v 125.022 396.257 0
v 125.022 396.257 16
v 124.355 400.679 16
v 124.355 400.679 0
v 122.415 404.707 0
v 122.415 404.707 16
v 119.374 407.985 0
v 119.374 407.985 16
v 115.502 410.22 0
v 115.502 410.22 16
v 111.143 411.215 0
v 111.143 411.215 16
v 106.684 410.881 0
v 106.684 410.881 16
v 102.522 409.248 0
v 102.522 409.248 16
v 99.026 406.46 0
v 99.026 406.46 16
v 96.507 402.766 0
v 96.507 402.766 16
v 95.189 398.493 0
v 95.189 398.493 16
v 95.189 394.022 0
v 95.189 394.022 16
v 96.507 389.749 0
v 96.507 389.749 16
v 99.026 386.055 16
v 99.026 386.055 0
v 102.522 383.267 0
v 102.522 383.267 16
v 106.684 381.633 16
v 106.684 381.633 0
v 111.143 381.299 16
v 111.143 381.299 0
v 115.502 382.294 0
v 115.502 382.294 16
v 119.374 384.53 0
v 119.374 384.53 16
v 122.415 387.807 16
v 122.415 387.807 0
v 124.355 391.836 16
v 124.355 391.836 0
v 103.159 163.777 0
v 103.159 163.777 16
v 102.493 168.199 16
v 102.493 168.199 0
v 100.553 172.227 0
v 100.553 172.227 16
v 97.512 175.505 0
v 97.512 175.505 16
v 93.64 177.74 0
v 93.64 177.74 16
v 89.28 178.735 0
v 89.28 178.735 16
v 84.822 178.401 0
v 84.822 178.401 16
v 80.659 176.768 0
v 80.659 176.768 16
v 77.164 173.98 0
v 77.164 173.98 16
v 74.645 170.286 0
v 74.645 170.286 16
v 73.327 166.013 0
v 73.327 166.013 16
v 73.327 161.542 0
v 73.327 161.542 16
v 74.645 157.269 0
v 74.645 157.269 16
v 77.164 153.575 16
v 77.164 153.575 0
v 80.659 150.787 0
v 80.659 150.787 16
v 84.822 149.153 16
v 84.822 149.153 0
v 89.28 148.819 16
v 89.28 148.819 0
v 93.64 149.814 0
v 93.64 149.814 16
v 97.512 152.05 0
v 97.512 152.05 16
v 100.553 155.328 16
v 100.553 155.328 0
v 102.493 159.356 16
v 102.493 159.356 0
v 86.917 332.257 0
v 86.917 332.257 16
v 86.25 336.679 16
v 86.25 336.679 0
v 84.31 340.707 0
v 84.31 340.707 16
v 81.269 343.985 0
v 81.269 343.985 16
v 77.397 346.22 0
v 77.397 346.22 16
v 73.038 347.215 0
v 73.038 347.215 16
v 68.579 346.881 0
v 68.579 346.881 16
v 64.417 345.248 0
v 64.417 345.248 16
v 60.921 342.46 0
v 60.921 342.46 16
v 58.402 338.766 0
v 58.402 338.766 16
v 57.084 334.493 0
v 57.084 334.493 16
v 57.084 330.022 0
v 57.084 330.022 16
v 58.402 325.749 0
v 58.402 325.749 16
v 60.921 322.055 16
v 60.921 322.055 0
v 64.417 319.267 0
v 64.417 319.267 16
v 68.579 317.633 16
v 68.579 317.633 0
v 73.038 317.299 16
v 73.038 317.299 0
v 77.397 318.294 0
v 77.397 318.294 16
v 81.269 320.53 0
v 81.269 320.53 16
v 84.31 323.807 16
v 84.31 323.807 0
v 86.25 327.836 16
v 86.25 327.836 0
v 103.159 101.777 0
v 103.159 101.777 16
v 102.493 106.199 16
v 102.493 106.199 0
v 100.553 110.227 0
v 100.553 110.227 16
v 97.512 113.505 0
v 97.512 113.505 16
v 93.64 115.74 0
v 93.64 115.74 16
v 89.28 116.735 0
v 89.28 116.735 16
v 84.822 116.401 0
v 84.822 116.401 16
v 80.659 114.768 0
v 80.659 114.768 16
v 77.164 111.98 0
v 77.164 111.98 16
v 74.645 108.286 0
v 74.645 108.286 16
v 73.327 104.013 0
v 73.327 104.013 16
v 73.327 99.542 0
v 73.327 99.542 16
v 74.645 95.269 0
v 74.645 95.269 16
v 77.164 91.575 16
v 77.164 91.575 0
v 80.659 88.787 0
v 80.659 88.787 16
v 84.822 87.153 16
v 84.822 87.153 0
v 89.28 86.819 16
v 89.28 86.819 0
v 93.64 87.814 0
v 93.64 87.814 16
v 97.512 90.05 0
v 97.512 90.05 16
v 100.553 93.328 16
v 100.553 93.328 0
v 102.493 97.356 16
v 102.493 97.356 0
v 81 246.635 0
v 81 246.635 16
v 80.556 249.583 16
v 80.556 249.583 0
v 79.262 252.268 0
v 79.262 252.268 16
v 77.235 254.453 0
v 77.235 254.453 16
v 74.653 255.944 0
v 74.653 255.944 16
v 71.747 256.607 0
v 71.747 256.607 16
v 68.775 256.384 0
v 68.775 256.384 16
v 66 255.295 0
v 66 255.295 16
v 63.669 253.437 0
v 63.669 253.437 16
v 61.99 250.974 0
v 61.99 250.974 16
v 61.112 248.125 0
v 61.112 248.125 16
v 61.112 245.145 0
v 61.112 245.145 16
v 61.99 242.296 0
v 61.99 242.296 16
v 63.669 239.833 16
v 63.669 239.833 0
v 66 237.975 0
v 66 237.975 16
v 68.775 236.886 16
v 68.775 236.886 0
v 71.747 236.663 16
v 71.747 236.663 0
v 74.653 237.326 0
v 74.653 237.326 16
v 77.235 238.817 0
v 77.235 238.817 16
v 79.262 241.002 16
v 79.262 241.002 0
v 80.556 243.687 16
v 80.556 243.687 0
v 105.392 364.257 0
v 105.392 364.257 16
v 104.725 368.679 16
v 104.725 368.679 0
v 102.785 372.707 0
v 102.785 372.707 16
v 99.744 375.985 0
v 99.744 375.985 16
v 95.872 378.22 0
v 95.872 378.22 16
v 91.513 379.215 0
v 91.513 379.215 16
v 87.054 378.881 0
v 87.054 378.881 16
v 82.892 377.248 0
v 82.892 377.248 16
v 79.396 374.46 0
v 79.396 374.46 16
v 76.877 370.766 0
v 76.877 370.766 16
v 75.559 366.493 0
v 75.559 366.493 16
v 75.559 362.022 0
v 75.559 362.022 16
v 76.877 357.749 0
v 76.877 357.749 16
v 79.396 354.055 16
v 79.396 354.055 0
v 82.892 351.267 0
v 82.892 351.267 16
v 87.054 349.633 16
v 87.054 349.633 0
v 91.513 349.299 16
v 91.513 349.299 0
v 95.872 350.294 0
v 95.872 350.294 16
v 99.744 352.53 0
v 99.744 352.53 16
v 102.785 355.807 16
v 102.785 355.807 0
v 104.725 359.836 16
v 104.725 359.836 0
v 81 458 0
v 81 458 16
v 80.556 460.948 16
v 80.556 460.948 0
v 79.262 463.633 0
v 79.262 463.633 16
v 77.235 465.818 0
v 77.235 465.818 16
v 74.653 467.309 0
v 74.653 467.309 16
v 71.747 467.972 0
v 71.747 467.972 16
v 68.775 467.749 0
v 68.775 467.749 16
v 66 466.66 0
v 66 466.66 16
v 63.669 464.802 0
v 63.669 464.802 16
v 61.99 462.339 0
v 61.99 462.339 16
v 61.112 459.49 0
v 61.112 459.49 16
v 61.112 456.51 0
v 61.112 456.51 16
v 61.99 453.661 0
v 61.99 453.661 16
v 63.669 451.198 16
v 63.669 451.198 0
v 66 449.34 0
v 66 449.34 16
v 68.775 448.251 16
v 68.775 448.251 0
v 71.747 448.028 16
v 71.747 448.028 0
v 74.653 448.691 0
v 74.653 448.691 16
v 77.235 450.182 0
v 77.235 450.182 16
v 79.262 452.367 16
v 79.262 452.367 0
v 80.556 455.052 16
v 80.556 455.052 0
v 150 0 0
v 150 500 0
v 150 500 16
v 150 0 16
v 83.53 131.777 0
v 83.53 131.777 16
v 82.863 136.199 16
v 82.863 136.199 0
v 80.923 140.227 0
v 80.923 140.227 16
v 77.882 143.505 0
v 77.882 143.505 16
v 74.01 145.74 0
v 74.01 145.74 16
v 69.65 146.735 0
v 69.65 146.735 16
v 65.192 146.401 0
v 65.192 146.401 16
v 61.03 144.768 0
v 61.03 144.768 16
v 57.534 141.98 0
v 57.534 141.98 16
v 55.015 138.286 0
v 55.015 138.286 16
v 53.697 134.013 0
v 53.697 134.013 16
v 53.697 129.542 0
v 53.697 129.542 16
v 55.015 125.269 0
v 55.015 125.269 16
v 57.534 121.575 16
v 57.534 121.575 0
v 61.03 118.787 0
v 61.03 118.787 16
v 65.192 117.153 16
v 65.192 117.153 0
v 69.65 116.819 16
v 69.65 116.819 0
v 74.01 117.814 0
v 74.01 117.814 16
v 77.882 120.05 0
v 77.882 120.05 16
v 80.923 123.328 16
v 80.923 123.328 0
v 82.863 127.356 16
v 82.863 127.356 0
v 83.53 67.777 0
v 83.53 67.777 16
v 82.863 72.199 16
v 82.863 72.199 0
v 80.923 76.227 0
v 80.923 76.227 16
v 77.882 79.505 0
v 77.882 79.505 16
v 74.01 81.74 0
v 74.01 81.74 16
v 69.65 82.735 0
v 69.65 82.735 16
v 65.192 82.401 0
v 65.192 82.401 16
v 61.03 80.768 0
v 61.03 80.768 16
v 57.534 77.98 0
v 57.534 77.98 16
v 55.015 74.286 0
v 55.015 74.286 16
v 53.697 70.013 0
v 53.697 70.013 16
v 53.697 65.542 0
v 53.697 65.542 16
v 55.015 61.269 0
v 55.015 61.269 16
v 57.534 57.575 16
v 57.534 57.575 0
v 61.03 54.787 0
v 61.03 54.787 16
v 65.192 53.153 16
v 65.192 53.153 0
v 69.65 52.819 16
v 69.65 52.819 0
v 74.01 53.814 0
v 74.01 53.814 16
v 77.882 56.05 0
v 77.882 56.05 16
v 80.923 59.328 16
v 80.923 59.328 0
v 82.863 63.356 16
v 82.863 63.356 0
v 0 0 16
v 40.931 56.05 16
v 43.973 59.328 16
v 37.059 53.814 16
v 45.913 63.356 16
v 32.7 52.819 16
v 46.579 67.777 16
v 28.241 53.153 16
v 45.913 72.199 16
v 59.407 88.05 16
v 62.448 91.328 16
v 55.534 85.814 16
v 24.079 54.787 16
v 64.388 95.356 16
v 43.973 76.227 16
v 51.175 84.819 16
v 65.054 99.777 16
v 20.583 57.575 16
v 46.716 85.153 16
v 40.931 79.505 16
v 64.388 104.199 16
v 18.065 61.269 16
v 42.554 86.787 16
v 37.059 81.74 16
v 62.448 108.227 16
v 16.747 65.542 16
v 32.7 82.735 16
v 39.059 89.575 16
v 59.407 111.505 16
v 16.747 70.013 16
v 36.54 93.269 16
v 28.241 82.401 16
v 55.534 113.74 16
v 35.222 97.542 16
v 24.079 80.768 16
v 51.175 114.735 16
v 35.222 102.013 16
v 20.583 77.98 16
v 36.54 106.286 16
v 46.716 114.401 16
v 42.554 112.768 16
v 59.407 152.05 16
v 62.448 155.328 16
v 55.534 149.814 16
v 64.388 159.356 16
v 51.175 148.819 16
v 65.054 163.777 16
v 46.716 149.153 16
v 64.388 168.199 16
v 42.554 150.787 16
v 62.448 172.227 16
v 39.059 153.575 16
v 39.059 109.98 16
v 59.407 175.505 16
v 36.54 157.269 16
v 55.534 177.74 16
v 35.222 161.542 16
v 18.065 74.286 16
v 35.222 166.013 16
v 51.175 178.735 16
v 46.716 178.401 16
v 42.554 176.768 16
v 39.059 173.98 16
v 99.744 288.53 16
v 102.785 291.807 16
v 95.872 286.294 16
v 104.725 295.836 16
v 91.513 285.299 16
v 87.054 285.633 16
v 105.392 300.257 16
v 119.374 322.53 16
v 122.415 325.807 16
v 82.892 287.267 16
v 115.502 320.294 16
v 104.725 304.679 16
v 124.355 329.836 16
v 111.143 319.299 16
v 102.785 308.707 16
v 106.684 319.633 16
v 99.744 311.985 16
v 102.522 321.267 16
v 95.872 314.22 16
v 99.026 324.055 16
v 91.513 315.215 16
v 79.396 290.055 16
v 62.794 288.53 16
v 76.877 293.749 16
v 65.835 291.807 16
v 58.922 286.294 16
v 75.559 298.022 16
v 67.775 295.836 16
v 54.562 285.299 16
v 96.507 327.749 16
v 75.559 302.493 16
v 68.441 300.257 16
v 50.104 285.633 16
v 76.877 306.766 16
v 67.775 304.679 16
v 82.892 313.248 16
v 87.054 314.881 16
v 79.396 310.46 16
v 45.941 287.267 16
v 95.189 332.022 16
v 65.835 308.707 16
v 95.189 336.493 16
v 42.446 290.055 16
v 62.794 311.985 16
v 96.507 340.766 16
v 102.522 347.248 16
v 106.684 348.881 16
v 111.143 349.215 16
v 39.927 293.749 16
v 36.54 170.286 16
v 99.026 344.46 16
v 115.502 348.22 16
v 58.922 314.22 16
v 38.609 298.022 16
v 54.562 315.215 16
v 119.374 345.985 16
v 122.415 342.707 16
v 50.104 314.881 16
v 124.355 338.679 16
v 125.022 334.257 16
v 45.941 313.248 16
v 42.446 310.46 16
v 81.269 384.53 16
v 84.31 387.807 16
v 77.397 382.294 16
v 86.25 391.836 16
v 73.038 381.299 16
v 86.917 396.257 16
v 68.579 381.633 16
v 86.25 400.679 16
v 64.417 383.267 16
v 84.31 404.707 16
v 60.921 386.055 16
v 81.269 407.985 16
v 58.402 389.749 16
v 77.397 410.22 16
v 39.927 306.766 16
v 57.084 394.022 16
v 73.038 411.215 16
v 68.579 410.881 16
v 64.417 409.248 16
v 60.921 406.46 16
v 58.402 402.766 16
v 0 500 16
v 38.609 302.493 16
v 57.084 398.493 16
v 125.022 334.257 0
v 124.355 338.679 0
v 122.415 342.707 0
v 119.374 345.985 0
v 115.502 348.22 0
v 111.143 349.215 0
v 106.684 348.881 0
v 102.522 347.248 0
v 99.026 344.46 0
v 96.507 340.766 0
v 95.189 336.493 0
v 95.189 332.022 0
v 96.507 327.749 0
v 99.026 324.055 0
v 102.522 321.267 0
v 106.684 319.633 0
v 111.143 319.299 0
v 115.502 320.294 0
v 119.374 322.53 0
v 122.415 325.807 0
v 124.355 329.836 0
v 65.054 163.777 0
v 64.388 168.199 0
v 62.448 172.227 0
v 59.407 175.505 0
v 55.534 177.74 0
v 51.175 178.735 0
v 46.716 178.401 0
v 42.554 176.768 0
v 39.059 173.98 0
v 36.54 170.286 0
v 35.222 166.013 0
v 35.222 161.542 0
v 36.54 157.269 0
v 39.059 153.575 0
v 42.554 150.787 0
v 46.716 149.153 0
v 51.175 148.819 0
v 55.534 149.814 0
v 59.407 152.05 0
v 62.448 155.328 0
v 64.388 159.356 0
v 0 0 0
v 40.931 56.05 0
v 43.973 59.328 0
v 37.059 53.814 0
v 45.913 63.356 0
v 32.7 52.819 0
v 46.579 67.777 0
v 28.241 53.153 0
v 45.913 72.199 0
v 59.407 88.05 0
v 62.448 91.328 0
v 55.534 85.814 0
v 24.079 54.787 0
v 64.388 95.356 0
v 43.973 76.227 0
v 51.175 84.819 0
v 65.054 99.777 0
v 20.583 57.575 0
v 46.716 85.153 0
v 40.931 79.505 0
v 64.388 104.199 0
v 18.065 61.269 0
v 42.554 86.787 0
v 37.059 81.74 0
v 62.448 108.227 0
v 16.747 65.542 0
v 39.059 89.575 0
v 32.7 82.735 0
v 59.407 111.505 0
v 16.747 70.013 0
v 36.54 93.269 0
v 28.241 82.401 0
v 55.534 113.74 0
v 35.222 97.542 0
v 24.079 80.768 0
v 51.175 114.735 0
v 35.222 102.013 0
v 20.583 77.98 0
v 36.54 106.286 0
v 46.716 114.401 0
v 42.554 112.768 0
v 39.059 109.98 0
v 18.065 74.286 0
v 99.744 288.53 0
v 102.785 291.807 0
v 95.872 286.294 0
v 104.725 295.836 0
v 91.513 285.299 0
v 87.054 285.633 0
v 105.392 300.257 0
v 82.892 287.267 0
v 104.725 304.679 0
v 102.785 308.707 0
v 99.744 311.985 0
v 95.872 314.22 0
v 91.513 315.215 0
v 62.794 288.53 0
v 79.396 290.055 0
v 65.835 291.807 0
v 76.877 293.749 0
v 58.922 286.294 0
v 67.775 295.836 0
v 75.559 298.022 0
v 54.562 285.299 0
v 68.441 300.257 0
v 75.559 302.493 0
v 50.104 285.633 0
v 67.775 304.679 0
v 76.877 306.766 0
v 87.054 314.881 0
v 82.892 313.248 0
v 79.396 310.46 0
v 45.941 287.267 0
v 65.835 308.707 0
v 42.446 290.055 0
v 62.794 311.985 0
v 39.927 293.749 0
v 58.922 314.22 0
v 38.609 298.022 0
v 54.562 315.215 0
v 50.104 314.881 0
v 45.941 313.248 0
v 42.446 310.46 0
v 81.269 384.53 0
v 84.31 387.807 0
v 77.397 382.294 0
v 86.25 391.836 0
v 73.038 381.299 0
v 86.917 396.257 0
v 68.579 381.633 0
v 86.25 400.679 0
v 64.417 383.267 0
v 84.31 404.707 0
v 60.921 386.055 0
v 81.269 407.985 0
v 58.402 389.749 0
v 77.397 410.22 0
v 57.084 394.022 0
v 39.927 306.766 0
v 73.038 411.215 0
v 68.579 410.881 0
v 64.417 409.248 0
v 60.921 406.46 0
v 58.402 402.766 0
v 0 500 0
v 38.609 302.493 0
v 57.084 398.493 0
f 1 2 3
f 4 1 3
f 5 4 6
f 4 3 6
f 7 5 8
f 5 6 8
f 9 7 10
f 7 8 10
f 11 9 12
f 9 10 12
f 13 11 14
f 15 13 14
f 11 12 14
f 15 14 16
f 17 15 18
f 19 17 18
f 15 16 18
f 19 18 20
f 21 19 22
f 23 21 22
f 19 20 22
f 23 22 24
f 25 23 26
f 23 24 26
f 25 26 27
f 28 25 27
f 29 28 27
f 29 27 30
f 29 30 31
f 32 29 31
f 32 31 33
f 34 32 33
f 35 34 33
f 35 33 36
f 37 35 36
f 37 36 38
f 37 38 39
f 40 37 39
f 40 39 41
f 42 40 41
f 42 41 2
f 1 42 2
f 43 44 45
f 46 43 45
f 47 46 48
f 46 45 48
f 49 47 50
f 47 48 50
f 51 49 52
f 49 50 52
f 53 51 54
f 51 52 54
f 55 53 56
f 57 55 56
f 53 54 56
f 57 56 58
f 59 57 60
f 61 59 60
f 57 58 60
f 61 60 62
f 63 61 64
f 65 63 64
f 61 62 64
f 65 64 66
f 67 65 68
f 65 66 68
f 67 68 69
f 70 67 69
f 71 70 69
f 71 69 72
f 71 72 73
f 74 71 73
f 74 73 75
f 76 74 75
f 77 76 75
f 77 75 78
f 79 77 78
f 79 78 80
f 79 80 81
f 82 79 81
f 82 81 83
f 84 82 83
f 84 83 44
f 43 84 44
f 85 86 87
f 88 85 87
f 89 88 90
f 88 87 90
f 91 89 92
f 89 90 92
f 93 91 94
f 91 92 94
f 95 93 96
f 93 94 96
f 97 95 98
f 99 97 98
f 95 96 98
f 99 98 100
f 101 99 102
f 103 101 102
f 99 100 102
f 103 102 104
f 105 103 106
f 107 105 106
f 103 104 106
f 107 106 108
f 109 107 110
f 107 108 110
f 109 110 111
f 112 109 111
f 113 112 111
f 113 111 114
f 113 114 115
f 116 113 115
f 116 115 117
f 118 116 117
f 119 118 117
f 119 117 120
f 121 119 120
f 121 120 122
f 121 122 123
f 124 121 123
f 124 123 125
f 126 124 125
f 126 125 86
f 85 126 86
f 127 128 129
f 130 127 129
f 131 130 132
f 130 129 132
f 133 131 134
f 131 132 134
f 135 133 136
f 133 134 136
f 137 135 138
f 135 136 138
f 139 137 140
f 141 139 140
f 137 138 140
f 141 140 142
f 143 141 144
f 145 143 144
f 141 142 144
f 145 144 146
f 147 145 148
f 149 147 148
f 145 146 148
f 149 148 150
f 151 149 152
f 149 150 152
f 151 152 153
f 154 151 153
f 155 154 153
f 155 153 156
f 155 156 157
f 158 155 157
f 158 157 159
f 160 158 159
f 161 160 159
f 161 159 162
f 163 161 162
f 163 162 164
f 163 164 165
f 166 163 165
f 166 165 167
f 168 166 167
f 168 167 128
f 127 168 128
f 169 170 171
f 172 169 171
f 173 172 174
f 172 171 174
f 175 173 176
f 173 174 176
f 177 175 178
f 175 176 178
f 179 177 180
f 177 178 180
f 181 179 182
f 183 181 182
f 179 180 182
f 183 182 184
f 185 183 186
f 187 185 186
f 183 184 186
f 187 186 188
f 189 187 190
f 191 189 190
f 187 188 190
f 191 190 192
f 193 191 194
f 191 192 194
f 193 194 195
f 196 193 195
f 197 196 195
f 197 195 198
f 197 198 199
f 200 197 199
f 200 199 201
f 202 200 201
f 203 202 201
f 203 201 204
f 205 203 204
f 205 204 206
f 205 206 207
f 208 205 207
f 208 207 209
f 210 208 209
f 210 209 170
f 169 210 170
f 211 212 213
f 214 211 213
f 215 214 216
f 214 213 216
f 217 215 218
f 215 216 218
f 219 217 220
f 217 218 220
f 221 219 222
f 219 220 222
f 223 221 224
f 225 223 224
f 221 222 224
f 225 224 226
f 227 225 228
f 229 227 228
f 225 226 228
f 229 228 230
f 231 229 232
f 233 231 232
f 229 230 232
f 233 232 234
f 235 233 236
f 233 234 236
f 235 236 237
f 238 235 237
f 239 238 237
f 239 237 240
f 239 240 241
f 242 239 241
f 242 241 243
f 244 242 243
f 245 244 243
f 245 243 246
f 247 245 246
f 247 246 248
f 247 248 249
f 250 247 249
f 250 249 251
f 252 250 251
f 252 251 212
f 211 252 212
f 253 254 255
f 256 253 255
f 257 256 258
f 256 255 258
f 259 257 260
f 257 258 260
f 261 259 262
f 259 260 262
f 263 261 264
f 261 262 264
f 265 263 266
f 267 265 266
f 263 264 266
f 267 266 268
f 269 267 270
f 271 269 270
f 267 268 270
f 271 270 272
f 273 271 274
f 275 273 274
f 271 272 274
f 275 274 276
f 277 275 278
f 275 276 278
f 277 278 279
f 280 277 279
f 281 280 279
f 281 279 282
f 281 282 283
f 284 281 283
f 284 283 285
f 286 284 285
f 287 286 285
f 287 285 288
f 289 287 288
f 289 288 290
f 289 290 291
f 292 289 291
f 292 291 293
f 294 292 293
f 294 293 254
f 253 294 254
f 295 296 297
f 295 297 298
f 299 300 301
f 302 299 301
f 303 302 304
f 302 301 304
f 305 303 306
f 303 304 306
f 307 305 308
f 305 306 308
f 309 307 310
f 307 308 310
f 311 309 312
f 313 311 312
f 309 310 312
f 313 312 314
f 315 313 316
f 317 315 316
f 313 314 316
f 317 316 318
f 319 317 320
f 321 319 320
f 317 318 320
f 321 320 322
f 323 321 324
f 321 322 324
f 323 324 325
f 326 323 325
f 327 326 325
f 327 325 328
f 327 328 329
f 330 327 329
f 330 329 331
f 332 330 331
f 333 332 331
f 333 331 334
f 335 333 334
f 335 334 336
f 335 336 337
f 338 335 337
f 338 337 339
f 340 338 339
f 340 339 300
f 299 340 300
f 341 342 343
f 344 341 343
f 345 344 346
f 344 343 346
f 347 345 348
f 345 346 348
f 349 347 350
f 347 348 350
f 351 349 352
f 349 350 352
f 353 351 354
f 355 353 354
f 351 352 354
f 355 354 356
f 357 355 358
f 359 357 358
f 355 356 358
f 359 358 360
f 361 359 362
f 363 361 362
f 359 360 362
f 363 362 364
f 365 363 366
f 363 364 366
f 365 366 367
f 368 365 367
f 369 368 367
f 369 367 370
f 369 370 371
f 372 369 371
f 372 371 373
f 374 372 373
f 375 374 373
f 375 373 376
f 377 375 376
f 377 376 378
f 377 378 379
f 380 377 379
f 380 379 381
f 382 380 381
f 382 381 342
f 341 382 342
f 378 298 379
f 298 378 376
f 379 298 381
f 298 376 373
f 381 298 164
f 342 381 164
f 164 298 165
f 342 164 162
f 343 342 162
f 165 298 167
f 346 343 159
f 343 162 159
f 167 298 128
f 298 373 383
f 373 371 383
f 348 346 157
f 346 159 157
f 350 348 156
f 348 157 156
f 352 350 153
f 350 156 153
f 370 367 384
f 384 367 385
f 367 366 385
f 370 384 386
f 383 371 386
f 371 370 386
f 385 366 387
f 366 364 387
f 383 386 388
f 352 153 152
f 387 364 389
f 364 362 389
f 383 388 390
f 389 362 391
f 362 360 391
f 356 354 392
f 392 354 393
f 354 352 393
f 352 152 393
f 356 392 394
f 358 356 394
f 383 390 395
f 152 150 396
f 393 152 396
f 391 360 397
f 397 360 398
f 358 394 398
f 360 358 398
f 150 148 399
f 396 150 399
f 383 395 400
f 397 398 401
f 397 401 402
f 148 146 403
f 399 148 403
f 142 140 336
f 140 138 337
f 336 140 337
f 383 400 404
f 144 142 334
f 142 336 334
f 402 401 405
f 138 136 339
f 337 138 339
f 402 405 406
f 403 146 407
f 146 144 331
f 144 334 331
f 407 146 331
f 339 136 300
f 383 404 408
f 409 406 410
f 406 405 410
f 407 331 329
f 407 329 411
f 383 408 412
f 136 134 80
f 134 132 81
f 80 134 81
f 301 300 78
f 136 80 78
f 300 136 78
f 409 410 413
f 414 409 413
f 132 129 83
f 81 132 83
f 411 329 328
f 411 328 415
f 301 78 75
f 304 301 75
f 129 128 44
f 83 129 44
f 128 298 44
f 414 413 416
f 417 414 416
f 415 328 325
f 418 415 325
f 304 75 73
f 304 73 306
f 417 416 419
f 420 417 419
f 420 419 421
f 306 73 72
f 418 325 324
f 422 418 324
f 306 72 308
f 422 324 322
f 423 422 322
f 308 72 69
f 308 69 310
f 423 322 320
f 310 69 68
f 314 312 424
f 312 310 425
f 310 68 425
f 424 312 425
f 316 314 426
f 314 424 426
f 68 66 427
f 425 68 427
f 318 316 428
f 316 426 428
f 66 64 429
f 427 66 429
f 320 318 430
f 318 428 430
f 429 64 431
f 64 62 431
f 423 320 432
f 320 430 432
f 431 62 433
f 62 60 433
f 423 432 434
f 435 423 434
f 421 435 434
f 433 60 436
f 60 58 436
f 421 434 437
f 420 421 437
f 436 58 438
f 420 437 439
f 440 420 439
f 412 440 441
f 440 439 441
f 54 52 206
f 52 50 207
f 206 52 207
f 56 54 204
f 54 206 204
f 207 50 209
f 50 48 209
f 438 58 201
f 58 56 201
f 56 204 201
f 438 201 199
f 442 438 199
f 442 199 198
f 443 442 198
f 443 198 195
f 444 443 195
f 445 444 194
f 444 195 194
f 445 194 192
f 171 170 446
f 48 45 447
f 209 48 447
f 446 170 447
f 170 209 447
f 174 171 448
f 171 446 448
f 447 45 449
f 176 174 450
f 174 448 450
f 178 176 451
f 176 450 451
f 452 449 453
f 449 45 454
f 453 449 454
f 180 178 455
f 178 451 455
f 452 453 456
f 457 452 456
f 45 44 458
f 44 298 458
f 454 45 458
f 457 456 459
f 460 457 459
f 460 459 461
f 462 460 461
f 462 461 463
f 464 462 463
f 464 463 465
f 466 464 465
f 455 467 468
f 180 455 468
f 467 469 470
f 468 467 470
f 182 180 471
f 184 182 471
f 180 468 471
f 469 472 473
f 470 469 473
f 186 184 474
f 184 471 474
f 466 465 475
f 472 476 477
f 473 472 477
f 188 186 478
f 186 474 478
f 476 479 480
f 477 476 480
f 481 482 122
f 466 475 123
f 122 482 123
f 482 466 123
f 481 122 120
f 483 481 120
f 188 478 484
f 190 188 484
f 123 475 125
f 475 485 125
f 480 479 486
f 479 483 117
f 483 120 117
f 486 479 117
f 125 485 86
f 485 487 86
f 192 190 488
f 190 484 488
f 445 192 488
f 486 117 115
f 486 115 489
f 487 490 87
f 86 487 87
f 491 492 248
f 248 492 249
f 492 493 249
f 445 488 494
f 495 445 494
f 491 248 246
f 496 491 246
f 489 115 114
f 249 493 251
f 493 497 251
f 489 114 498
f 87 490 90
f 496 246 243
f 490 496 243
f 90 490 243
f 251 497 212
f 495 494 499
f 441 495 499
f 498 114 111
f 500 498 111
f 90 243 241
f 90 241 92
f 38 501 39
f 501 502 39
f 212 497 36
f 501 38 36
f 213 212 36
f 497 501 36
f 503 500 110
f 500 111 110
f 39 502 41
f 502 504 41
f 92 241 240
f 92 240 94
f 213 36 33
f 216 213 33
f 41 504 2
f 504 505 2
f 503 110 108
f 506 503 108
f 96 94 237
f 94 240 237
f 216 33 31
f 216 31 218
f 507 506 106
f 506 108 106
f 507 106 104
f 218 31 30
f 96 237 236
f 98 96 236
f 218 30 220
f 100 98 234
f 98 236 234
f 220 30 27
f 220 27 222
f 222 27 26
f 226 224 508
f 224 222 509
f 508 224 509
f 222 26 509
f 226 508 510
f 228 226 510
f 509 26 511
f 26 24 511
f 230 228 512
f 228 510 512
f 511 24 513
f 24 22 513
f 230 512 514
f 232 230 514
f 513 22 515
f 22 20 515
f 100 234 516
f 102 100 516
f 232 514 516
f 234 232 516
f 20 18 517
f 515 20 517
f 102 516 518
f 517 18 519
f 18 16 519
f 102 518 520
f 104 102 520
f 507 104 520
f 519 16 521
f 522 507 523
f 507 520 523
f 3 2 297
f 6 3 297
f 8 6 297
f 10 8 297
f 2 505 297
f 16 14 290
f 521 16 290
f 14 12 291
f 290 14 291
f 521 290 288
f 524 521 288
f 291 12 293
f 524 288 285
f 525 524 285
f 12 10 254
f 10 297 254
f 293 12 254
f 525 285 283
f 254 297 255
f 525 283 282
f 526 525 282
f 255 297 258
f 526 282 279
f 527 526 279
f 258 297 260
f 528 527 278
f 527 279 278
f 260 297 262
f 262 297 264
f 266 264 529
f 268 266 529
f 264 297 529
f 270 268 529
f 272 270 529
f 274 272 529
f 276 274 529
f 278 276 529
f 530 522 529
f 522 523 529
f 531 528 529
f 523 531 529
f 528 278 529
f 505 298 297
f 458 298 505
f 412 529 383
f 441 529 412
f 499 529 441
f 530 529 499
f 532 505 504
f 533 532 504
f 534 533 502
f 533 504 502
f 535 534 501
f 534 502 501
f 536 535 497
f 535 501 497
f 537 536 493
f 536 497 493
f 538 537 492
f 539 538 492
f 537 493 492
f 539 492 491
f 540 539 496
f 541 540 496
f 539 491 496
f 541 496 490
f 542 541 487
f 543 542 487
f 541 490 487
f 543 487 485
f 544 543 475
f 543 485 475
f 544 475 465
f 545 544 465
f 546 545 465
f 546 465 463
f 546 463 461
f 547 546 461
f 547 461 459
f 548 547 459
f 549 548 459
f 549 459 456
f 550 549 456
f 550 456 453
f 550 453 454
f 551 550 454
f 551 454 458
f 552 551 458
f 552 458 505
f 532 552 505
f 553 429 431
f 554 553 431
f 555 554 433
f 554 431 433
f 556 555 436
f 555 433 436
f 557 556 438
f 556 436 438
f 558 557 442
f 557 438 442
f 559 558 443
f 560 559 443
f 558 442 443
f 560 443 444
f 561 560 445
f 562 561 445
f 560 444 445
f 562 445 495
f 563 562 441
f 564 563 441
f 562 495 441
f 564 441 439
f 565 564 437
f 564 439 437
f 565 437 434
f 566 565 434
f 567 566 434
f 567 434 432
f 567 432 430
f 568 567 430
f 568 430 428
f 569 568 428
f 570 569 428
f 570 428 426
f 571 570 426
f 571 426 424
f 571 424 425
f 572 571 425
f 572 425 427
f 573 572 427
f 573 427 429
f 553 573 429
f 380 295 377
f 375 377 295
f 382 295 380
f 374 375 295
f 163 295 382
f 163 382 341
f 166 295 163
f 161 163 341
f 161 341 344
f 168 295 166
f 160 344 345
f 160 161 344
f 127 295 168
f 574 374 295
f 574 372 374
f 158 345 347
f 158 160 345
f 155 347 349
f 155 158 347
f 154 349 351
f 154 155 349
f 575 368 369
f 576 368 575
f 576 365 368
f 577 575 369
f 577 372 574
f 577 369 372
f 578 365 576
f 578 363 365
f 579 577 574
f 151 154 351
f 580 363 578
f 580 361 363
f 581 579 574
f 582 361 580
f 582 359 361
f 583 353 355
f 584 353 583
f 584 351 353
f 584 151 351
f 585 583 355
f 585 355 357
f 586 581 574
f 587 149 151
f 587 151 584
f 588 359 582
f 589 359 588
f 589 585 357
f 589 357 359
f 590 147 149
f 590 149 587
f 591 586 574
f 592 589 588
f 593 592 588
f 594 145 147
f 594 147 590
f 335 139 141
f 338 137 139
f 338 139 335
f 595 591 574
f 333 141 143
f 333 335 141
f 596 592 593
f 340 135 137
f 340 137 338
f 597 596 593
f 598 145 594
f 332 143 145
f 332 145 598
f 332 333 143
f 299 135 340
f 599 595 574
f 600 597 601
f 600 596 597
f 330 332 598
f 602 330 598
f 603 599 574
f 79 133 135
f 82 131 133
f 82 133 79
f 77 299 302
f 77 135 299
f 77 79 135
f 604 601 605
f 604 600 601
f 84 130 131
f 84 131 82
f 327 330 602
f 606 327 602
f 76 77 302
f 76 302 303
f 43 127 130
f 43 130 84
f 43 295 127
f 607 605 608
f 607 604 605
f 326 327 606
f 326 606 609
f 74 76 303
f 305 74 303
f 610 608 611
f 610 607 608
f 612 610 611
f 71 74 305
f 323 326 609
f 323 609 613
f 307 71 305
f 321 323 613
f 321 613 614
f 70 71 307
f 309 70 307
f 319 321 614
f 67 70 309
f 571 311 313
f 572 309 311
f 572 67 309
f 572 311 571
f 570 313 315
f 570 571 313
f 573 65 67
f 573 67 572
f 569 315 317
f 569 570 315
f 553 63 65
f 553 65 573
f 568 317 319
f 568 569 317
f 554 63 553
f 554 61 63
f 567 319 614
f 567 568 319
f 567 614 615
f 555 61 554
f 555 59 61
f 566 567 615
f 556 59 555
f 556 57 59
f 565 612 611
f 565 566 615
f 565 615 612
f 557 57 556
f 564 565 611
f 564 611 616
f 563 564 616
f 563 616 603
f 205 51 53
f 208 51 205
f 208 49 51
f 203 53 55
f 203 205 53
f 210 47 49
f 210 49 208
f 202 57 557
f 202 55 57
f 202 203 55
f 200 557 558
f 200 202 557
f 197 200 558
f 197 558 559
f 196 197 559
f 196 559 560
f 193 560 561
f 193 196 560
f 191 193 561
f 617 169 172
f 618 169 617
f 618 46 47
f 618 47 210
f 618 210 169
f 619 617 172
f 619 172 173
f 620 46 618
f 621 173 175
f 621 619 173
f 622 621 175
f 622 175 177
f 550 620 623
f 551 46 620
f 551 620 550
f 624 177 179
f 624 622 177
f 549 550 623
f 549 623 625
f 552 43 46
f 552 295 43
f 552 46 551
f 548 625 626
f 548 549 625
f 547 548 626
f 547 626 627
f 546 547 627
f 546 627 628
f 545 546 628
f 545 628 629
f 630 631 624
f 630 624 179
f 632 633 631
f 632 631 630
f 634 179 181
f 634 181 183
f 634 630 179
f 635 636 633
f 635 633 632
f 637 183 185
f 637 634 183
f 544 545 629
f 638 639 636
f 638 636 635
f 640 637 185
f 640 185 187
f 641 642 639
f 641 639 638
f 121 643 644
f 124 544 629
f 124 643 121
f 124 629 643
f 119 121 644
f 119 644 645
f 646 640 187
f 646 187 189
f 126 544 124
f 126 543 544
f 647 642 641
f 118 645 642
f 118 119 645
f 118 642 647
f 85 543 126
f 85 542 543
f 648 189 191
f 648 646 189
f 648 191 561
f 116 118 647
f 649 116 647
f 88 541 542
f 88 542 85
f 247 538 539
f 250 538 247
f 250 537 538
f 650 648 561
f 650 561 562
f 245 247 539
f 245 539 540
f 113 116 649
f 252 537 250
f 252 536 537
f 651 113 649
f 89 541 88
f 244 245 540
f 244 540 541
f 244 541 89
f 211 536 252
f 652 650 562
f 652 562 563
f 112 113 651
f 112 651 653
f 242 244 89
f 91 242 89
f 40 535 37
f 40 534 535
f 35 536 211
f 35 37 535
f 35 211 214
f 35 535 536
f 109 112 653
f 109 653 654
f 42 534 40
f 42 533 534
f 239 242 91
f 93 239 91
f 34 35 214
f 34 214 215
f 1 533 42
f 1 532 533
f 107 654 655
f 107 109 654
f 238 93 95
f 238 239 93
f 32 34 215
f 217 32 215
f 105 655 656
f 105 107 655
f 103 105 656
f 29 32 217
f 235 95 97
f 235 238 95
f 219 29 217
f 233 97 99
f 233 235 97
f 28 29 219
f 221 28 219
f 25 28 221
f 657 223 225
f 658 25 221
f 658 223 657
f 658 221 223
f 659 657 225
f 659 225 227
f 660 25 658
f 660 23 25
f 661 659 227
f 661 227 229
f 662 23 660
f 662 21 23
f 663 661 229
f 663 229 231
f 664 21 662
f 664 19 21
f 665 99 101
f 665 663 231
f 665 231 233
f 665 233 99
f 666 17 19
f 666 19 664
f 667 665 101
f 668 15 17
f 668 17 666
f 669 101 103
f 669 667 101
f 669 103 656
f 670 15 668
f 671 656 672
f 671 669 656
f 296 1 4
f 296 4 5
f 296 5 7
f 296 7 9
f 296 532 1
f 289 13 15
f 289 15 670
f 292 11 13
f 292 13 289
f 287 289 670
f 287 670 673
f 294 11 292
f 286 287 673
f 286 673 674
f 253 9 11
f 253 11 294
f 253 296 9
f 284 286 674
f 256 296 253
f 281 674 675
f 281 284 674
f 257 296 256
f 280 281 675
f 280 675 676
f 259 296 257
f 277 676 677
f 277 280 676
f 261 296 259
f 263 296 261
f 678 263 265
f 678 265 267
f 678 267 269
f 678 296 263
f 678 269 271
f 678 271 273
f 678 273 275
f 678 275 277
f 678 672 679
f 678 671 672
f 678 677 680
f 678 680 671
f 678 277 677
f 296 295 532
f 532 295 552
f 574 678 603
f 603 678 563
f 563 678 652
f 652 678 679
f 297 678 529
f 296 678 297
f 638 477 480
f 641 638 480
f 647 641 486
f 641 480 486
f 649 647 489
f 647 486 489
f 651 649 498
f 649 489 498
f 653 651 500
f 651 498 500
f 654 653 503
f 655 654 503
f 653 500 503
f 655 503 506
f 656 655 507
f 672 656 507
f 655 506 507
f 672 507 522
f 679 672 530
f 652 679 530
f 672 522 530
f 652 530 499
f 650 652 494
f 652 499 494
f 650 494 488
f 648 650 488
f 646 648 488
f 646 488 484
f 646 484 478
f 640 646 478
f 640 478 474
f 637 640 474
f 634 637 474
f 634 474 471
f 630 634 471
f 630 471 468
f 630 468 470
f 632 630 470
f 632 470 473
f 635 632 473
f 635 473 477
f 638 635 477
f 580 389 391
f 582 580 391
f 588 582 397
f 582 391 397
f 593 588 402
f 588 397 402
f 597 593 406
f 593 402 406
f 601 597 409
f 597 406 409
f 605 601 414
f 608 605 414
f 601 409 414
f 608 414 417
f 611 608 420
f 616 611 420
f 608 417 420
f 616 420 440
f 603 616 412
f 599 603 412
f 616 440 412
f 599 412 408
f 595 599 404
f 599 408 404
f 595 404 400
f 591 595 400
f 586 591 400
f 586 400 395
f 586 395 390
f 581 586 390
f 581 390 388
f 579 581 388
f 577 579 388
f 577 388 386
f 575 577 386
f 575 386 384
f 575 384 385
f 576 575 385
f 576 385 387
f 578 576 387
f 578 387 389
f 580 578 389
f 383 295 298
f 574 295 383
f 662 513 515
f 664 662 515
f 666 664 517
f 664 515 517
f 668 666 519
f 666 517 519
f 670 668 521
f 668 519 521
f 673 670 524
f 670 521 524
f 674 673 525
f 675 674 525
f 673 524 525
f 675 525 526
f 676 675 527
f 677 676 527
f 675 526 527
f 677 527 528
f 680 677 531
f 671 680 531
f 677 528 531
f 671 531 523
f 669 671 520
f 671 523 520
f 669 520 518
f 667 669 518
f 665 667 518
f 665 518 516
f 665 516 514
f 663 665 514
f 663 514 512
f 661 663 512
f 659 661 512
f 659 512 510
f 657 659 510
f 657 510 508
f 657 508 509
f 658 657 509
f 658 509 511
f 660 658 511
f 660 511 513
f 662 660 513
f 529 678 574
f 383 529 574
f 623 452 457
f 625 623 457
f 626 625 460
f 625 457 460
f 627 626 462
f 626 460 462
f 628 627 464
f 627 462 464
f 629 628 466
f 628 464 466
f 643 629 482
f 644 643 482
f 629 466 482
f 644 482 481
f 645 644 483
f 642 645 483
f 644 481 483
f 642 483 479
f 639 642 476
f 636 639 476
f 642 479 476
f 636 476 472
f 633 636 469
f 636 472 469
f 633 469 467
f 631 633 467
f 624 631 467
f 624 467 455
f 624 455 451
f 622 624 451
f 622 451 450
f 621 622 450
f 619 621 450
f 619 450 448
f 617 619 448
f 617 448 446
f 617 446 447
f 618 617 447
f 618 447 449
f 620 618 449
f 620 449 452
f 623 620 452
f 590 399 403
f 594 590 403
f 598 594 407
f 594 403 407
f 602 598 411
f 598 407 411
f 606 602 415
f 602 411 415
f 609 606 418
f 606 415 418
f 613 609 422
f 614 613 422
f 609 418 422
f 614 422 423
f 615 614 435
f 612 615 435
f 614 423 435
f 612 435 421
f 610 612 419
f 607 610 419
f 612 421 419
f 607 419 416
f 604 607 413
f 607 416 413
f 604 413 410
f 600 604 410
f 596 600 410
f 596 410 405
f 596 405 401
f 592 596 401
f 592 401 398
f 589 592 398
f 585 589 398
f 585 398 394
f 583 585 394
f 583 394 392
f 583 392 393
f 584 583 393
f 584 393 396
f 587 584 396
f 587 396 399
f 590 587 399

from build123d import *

# Parameters (mm, degrees)
PAD_DEPTH     = 16
SKETCH001_R   = 15
SKETCH001_R_2 = 10
POCKET_DEPTH  = 16.001


with BuildPart() as part:
    # Sketch → Pad (new body)
    with BuildSketch(Plane.XY):
        Polygon((0, 500), (150, 500), (150, 0), (0, 0), (0, 250), align=None)
    extrude(amount=PAD_DEPTH)

    # Sketch001 (on Face7 of Pad) → Pocket (cut, through all)
    with BuildSketch(Plane.XY.offset(16)):
        with Locations((31.579084, 67.777323)):
            Circle(SKETCH001_R)
        with Locations((50.054292, 99.777323)):
            Circle(SKETCH001_R)
        with Locations((68.529501, 131.777323)):
            Circle(SKETCH001_R)
        with Locations((50.054292, 163.777323)):
            Circle(SKETCH001_R)
        with Locations((71, 246.635039)):
            Circle(SKETCH001_R_2)
        with Locations((68.529501, 67.777323)):
            Circle(SKETCH001_R)
        with Locations((88.15941, 101.777323)):
            Circle(SKETCH001_R)
        with Locations((88.15941, 163.777323)):
            Circle(SKETCH001_R)
        with Locations((53.441466, 300.257294)):
            Circle(SKETCH001_R)
        with Locations((71.916674, 332.257294)):
            Circle(SKETCH001_R)
        with Locations((90.391883, 364.257294)):
            Circle(SKETCH001_R)
        with Locations((71.916674, 396.257294)):
            Circle(SKETCH001_R)
        with Locations((71, 458)):
            Circle(SKETCH001_R_2)
        with Locations((90.391883, 300.257294)):
            Circle(SKETCH001_R)
        with Locations((110.021792, 334.257294)):
            Circle(SKETCH001_R)
        with Locations((110.021792, 396.257294)):
            Circle(SKETCH001_R)
    extrude(amount=-POCKET_DEPTH, mode=Mode.SUBTRACT)


solid = part.part
